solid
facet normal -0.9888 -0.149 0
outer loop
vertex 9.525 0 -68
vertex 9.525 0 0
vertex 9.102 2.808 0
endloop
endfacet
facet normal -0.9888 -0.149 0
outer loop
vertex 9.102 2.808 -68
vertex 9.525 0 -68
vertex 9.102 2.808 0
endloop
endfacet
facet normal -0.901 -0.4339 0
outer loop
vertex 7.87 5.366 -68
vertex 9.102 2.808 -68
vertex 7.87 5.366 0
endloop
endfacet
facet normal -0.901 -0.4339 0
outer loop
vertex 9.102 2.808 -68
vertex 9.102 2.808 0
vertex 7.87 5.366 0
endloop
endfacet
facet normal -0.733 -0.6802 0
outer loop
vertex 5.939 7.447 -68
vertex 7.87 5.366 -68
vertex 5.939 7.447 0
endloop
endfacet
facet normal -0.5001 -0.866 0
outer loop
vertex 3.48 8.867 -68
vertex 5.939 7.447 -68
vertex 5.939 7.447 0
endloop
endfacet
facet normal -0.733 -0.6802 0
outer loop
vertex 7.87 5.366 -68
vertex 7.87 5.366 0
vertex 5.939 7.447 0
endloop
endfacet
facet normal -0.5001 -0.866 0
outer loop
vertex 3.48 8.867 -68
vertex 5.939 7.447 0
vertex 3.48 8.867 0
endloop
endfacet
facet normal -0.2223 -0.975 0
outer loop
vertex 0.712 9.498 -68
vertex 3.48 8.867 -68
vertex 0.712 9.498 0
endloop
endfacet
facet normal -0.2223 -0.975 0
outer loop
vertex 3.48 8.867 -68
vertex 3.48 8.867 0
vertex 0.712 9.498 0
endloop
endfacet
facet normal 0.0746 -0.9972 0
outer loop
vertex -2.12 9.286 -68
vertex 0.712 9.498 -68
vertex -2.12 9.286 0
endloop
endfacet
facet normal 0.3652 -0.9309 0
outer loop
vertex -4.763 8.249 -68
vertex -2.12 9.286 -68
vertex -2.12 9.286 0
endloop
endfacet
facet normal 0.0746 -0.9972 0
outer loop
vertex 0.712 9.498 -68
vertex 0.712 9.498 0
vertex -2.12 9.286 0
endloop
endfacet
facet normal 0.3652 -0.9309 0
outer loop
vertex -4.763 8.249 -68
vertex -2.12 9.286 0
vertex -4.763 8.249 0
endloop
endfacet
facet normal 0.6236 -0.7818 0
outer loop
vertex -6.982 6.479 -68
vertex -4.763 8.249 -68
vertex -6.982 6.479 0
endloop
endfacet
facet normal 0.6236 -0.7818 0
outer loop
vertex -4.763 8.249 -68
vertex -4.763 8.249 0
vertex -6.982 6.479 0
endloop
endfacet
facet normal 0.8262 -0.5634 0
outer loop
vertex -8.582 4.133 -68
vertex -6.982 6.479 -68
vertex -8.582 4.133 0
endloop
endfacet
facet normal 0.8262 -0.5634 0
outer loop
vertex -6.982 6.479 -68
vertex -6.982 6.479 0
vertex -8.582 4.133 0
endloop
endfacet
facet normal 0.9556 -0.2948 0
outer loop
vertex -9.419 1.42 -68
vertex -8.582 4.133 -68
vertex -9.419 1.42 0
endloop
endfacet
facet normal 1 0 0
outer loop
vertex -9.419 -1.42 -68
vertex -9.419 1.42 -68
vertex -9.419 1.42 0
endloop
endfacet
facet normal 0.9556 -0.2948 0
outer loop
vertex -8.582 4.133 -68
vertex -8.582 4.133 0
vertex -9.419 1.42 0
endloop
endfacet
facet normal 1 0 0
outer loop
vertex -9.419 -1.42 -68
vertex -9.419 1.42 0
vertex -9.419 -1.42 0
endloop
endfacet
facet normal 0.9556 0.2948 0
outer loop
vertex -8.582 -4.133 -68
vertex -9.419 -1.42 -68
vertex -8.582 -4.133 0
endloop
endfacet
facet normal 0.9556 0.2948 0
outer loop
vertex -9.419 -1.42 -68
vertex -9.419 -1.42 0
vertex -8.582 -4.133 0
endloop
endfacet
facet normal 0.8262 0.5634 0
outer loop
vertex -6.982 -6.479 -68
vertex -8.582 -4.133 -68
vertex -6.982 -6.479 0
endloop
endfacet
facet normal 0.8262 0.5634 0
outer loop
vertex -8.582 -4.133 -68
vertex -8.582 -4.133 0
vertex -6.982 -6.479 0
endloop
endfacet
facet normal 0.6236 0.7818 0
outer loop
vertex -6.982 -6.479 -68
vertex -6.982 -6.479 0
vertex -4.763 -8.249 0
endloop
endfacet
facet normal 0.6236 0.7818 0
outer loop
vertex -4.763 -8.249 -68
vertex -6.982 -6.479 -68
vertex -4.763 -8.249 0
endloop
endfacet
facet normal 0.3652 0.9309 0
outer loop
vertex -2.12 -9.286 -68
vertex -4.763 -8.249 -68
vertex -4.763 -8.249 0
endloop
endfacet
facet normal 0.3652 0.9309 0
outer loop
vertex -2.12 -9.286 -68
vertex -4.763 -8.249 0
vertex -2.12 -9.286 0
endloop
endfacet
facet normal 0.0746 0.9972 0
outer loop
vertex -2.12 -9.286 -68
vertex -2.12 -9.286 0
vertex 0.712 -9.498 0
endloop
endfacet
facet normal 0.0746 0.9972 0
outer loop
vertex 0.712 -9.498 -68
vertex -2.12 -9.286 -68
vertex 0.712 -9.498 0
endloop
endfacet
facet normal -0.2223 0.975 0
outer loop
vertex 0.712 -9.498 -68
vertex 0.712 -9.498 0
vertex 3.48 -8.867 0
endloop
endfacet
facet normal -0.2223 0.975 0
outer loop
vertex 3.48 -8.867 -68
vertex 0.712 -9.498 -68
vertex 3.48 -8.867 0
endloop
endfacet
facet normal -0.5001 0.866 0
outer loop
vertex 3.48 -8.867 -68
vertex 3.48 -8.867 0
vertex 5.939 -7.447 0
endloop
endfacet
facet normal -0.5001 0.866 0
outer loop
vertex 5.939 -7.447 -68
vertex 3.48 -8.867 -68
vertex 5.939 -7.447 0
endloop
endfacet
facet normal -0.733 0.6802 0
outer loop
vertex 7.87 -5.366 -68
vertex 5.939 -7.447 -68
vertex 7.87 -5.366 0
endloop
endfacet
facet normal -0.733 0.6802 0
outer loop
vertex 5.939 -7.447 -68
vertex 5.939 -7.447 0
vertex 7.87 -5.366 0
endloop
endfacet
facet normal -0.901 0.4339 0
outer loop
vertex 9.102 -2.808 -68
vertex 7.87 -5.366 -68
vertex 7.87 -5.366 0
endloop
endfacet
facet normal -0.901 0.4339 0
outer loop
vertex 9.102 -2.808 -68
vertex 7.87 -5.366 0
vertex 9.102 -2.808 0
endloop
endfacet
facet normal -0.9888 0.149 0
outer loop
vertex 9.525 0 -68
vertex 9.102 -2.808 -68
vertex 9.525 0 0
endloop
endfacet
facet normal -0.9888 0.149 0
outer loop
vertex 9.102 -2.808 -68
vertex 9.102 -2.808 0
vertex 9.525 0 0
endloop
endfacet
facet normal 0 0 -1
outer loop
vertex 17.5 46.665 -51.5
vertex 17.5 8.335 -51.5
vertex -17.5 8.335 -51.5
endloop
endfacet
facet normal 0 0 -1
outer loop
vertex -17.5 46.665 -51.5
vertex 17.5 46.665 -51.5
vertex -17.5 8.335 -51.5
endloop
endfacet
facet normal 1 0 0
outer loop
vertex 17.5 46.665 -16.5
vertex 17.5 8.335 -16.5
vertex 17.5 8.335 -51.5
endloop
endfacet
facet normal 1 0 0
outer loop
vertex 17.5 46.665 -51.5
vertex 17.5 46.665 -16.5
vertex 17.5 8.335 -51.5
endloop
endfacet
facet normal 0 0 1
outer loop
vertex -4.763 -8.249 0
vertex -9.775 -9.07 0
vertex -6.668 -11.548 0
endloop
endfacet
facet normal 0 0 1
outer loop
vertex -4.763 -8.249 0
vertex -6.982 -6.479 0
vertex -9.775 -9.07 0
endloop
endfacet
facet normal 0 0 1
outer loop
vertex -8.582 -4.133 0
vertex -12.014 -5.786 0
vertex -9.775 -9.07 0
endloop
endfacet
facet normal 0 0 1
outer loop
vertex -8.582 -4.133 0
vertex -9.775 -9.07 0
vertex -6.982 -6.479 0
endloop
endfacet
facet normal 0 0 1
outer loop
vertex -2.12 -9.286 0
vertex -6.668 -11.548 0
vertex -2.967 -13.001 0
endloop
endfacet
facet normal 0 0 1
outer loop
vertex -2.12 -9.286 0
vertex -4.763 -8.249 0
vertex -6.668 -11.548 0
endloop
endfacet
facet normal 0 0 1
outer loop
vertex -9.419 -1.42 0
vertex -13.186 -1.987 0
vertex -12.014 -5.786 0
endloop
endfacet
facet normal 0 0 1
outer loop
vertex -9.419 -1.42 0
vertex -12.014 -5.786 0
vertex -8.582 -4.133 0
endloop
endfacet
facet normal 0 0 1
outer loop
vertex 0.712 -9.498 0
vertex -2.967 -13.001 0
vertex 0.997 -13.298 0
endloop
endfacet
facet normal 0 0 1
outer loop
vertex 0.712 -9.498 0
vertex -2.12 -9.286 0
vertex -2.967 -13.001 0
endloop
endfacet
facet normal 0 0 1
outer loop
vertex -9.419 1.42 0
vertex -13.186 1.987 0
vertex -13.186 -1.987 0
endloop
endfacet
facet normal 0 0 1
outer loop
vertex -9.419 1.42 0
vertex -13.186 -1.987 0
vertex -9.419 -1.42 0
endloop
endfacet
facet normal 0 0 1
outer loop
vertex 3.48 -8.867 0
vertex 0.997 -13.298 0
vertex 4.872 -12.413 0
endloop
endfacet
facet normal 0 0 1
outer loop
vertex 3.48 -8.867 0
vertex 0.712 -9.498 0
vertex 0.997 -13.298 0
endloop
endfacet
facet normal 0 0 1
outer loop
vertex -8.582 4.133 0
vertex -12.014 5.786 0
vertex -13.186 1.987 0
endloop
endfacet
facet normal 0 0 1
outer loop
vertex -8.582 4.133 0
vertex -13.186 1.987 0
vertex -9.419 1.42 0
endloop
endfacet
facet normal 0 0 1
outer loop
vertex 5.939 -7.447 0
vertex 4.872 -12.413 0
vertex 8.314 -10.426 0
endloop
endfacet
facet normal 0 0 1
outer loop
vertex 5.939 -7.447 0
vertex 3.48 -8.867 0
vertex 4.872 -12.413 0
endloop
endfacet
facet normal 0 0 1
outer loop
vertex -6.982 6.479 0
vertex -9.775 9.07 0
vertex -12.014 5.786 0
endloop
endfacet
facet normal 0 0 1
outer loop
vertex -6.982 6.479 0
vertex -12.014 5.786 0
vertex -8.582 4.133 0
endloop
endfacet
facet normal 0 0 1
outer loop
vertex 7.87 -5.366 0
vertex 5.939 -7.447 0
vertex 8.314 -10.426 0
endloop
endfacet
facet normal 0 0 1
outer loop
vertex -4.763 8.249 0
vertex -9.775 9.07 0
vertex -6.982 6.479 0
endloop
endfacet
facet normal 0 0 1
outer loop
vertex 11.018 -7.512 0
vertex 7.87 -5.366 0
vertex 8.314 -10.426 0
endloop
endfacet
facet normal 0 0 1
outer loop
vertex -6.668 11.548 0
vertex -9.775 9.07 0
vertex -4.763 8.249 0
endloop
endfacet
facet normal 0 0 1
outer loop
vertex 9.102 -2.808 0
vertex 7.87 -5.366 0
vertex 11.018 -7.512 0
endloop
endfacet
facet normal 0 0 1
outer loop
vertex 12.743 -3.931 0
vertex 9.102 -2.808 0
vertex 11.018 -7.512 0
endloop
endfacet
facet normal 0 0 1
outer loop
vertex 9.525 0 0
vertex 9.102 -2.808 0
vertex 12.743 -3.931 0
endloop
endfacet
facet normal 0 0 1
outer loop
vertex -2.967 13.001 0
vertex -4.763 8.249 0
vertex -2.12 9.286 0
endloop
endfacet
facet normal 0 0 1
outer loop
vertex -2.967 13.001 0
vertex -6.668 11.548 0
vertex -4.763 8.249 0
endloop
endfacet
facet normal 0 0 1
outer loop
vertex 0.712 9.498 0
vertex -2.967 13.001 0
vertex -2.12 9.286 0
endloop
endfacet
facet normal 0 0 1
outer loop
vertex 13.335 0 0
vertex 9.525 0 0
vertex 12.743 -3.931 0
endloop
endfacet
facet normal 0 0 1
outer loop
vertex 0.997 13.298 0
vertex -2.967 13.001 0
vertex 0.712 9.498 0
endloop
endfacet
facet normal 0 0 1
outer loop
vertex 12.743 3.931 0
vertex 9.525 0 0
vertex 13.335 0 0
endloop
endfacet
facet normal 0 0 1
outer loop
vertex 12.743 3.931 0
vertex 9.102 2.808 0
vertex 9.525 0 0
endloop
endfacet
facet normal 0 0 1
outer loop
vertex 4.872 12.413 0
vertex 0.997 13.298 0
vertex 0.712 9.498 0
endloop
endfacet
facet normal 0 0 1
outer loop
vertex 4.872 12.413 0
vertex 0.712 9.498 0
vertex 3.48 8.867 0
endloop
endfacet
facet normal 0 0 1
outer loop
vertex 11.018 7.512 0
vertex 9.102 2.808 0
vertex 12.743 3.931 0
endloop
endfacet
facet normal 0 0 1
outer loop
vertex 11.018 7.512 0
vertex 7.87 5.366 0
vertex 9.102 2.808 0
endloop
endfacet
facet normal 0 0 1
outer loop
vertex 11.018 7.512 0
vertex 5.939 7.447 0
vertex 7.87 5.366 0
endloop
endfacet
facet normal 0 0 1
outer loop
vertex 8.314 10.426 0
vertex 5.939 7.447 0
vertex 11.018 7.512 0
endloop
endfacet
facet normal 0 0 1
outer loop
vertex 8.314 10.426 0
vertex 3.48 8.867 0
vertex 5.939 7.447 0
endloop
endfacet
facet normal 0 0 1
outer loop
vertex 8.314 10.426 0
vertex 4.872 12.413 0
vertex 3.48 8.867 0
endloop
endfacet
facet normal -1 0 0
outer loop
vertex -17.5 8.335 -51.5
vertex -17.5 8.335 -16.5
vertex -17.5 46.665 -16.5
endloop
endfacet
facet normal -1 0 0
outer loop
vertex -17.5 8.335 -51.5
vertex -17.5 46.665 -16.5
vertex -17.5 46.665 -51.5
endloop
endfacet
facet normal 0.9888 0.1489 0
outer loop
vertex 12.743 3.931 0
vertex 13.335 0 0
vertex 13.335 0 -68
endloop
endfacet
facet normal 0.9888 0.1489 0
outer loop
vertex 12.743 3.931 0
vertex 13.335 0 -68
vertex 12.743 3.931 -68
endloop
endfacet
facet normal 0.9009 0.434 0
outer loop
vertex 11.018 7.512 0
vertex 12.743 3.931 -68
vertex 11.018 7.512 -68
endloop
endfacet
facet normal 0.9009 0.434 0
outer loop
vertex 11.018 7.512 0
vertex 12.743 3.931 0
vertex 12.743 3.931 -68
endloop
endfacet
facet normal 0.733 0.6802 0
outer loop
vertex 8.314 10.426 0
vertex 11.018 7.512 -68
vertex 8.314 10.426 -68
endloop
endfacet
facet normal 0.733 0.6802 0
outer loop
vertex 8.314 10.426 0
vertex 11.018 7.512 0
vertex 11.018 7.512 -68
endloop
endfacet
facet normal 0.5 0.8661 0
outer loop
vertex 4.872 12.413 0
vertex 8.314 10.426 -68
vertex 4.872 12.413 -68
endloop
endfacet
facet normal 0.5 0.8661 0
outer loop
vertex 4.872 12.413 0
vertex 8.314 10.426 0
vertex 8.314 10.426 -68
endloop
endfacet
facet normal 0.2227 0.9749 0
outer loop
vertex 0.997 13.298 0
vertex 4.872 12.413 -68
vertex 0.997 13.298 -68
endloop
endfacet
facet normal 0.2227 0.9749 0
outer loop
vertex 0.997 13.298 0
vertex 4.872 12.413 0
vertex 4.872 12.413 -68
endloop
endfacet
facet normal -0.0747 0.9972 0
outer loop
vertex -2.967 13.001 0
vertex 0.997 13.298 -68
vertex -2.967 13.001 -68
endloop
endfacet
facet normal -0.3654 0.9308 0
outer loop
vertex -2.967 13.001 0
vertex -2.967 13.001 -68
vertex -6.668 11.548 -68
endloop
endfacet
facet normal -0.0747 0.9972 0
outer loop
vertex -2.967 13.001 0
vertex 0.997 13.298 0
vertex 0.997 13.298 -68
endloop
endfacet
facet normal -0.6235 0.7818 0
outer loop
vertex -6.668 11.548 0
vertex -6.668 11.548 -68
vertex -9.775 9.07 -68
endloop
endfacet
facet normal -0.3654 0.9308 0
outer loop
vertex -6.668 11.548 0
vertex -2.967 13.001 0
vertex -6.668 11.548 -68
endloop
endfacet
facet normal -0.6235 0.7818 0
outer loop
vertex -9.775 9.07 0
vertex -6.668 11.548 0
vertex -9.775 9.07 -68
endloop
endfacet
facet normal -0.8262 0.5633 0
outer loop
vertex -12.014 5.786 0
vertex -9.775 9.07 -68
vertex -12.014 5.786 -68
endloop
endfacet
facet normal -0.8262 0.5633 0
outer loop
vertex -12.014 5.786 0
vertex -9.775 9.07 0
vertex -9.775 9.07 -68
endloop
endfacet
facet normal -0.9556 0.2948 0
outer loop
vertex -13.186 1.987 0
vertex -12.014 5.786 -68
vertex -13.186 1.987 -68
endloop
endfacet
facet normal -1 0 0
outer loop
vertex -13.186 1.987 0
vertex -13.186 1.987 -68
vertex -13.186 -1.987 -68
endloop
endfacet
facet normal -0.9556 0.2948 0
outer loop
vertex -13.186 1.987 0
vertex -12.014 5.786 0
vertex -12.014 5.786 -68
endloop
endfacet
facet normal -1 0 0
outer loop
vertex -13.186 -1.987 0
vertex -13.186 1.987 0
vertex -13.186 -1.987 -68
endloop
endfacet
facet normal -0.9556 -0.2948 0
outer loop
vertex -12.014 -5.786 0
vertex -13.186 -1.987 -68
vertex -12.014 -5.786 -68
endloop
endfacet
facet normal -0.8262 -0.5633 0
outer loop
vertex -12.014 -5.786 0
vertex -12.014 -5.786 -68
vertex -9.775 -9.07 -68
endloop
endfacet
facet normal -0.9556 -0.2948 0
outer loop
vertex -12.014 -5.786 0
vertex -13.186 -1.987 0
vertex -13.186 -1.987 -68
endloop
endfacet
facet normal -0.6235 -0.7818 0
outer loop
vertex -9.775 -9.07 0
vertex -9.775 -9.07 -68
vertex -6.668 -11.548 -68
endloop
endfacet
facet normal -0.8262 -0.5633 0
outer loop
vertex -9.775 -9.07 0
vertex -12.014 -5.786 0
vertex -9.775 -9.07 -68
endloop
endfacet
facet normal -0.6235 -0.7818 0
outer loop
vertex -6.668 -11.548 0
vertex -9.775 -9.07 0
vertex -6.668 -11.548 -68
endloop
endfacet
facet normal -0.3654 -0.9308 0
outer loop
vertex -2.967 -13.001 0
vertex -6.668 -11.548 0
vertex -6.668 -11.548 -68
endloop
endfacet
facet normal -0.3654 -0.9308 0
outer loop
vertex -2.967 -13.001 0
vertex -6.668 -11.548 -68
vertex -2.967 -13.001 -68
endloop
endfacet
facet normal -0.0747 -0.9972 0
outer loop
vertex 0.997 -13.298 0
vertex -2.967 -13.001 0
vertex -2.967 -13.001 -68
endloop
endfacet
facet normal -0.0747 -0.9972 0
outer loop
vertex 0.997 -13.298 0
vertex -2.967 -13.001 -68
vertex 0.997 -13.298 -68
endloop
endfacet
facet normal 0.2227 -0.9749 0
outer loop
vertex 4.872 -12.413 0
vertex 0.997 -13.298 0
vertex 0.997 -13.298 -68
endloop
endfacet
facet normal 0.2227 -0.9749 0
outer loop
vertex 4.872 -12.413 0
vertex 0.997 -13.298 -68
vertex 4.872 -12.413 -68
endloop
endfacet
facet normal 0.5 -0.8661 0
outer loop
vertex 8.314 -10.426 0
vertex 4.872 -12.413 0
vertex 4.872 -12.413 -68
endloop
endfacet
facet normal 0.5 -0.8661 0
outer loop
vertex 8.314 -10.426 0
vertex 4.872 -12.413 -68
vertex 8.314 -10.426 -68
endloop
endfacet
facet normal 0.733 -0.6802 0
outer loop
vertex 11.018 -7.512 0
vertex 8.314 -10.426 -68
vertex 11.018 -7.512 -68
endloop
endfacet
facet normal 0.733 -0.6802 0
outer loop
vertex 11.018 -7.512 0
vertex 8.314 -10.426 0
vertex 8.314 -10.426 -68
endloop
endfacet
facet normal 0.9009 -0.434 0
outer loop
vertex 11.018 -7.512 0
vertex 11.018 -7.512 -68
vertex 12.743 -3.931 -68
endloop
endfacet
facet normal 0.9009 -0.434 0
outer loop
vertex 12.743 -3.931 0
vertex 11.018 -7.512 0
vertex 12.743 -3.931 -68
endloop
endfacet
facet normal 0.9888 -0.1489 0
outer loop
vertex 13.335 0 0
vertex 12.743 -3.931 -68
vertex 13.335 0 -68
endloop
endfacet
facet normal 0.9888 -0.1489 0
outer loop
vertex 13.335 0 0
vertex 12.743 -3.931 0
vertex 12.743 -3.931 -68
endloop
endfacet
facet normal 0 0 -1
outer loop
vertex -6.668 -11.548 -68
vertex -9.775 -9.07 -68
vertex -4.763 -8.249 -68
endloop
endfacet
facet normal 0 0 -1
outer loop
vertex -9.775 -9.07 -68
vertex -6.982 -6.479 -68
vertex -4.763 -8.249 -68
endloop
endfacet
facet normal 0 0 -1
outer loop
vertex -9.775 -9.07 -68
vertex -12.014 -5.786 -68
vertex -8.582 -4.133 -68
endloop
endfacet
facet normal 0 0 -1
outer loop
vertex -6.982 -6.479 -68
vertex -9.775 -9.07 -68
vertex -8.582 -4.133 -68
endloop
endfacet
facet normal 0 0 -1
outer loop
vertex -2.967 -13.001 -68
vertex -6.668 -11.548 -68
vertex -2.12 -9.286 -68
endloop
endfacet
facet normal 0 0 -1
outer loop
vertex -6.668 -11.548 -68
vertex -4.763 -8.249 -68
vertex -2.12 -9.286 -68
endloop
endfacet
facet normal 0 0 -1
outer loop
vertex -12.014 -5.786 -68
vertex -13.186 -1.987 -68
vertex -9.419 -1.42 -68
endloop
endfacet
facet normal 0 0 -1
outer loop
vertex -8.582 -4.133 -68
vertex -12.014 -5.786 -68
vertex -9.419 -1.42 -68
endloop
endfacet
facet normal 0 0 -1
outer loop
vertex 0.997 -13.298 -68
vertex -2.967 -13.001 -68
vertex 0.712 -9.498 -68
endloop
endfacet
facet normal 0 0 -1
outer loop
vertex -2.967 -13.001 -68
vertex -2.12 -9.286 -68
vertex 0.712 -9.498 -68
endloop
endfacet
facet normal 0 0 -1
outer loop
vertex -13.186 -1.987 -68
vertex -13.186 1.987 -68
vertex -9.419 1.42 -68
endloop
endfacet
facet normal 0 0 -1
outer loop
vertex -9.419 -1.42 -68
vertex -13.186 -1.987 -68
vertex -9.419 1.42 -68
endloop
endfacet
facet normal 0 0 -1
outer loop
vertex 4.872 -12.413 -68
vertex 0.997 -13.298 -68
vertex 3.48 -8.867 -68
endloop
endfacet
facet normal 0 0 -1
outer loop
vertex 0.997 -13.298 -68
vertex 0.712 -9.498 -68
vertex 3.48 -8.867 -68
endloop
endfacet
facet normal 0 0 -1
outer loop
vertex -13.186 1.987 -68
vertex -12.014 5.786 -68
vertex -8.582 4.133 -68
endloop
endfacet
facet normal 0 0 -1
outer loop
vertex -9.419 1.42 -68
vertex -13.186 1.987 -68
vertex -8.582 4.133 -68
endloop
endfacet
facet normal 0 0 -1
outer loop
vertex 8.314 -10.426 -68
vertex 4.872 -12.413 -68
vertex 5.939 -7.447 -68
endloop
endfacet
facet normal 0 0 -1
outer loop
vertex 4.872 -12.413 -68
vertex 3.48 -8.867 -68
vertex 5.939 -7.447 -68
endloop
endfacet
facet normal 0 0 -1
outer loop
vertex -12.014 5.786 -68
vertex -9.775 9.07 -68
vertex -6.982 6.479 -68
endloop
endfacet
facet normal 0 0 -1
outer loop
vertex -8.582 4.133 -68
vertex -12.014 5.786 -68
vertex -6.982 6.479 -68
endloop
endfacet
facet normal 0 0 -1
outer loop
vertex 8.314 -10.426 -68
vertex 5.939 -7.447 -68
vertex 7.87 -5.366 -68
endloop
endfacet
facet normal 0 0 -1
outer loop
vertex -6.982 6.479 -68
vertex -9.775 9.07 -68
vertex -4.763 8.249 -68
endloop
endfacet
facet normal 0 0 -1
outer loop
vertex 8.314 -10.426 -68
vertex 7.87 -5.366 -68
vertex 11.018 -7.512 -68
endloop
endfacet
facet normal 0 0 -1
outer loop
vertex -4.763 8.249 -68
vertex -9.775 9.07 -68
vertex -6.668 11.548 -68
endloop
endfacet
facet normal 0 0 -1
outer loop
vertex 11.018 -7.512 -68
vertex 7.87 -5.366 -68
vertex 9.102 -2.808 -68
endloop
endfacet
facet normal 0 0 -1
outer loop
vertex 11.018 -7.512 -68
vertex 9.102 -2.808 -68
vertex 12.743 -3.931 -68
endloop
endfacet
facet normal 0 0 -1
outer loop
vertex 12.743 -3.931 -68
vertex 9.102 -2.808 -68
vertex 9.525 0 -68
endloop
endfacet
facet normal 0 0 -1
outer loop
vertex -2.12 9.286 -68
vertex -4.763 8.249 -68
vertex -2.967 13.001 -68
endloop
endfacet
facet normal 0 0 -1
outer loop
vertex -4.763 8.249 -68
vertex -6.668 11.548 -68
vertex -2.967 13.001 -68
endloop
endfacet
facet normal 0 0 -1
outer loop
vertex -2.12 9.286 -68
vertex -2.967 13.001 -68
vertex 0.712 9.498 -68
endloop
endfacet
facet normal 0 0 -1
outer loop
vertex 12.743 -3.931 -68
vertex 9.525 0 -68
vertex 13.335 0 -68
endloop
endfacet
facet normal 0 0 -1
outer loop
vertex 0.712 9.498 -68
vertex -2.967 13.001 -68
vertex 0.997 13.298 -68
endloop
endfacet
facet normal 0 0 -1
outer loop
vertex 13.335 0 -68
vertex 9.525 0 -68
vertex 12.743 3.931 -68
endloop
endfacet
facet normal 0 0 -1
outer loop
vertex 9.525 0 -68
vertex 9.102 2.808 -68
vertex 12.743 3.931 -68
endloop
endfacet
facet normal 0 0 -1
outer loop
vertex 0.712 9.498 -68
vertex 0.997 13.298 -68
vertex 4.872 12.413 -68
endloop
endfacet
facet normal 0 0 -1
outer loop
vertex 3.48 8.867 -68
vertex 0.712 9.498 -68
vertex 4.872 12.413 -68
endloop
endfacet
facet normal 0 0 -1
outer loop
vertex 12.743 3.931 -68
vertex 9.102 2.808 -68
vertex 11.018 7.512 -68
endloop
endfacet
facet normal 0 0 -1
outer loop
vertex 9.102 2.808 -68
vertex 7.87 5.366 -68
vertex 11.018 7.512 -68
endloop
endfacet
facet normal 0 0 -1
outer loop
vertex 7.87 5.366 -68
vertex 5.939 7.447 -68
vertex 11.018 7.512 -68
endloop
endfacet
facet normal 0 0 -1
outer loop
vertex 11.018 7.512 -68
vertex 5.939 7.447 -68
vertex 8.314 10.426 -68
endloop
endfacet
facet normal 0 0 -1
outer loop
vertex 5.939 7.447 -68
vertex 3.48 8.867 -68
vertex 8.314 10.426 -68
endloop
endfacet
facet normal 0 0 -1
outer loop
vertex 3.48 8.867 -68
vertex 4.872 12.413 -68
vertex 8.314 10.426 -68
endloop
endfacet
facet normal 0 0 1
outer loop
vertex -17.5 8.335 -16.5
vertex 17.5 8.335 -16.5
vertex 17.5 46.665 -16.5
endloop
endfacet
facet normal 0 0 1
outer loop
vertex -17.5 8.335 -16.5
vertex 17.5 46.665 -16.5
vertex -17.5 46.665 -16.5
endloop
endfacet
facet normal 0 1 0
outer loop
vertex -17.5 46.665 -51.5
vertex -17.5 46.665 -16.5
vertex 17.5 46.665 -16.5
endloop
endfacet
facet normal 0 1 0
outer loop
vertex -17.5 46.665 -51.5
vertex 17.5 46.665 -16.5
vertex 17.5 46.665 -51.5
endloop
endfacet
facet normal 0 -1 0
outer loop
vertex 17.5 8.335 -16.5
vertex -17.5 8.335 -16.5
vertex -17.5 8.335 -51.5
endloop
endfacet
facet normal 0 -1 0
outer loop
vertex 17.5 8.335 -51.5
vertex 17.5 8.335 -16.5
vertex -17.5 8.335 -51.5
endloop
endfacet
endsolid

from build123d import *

# Parameters (mm, degrees)
SKETCH1_R                = 13.335
SKETCH1_R_2              = 9.525
BOSS_EXTRUDE1_DEPTH      = 68
BOSS_EXTRUDE2_DEPTH      = 33.33
BOSS_EXTRUDE2_DEPTH_BACK = 5
SKETCH3_W                = 35
SKETCH3_H                = 35


with BuildPart() as part:
    # Sketch1 → Boss-Extrude1 (new body)
    with BuildSketch(Plane.XY):
        Circle(SKETCH1_R)
        Circle(SKETCH1_R_2, mode=Mode.SUBTRACT)
    extrude(amount=-BOSS_EXTRUDE1_DEPTH)


with BuildPart() as body_2:
    # Sketch3 → Boss-Extrude2 (new, two sides: drawn at the far end of the back side and taken through both)
    with BuildSketch(Plane(origin=(0, 13.335, 0), x_dir=(0, 0, -1), z_dir=(0, 1, 0)).offset(-BOSS_EXTRUDE2_DEPTH_BACK)):
        with Locations((34, 0)):
            Rectangle(SKETCH3_W, SKETCH3_H)
    extrude(amount=BOSS_EXTRUDE2_DEPTH + BOSS_EXTRUDE2_DEPTH_BACK)


solid = Compound([part.part, body_2.part])
